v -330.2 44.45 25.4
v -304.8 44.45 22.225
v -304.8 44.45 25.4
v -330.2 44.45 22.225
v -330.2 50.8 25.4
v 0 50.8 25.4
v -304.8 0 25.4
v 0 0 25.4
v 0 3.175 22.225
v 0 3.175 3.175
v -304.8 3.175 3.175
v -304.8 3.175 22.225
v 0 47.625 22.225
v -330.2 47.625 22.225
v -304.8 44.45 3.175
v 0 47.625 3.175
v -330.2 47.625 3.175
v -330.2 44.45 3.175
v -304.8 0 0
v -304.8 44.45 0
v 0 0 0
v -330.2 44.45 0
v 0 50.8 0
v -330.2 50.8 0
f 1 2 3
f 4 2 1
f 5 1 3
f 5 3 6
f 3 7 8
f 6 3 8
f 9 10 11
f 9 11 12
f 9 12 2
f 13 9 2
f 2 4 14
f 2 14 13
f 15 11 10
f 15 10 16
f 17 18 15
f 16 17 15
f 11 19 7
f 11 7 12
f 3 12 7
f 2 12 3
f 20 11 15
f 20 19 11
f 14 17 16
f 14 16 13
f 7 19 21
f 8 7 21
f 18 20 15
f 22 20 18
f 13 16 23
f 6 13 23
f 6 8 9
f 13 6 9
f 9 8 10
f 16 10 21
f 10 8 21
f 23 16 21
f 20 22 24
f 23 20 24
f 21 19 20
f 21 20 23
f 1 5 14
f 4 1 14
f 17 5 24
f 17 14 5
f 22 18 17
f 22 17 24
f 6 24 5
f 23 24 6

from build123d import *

# Parameters (mm, degrees)
SKETCH1_W           = 330.2
SKETCH1_H           = 25.4
BOSS_EXTRUDE4_DEPTH = 50.8
SKETCH5_W           = 19.05
SKETCH5_H           = 44.45
CUT_EXTRUDE1_DEPTH  = 330.2
SKETCH7_W           = 25.4
SKETCH7_H           = 44.45
CUT_EXTRUDE4_DEPTH  = 31.496


with BuildPart() as part:
    # Sketch1 → Boss-Extrude4 (new body)
    with BuildSketch(Plane(origin=(0, 0, 0), x_dir=(1, 0, 0), z_dir=(0, 1, 0))):
        with Locations((-165.1, -12.7)):
            Rectangle(SKETCH1_W, SKETCH1_H)
    extrude(amount=BOSS_EXTRUDE4_DEPTH)

    # Sketch5 → Cut-Extrude1 (cut)
    with BuildSketch(Plane.ZY.offset(330.2)):
        with Locations((12.7, 25.4)):
            Rectangle(SKETCH5_W, SKETCH5_H)
    extrude(amount=-CUT_EXTRUDE1_DEPTH, mode=Mode.SUBTRACT)

    # Sketch7 → Cut-Extrude4 (cut)
    with BuildSketch(Plane(origin=(0, 0, 0), x_dir=(-1, 0, 0), z_dir=(0, 0, -1))):
        with Locations((317.5, 22.225)):
            Rectangle(SKETCH7_W, SKETCH7_H)
    extrude(amount=-CUT_EXTRUDE4_DEPTH, mode=Mode.SUBTRACT)


solid = part.part
